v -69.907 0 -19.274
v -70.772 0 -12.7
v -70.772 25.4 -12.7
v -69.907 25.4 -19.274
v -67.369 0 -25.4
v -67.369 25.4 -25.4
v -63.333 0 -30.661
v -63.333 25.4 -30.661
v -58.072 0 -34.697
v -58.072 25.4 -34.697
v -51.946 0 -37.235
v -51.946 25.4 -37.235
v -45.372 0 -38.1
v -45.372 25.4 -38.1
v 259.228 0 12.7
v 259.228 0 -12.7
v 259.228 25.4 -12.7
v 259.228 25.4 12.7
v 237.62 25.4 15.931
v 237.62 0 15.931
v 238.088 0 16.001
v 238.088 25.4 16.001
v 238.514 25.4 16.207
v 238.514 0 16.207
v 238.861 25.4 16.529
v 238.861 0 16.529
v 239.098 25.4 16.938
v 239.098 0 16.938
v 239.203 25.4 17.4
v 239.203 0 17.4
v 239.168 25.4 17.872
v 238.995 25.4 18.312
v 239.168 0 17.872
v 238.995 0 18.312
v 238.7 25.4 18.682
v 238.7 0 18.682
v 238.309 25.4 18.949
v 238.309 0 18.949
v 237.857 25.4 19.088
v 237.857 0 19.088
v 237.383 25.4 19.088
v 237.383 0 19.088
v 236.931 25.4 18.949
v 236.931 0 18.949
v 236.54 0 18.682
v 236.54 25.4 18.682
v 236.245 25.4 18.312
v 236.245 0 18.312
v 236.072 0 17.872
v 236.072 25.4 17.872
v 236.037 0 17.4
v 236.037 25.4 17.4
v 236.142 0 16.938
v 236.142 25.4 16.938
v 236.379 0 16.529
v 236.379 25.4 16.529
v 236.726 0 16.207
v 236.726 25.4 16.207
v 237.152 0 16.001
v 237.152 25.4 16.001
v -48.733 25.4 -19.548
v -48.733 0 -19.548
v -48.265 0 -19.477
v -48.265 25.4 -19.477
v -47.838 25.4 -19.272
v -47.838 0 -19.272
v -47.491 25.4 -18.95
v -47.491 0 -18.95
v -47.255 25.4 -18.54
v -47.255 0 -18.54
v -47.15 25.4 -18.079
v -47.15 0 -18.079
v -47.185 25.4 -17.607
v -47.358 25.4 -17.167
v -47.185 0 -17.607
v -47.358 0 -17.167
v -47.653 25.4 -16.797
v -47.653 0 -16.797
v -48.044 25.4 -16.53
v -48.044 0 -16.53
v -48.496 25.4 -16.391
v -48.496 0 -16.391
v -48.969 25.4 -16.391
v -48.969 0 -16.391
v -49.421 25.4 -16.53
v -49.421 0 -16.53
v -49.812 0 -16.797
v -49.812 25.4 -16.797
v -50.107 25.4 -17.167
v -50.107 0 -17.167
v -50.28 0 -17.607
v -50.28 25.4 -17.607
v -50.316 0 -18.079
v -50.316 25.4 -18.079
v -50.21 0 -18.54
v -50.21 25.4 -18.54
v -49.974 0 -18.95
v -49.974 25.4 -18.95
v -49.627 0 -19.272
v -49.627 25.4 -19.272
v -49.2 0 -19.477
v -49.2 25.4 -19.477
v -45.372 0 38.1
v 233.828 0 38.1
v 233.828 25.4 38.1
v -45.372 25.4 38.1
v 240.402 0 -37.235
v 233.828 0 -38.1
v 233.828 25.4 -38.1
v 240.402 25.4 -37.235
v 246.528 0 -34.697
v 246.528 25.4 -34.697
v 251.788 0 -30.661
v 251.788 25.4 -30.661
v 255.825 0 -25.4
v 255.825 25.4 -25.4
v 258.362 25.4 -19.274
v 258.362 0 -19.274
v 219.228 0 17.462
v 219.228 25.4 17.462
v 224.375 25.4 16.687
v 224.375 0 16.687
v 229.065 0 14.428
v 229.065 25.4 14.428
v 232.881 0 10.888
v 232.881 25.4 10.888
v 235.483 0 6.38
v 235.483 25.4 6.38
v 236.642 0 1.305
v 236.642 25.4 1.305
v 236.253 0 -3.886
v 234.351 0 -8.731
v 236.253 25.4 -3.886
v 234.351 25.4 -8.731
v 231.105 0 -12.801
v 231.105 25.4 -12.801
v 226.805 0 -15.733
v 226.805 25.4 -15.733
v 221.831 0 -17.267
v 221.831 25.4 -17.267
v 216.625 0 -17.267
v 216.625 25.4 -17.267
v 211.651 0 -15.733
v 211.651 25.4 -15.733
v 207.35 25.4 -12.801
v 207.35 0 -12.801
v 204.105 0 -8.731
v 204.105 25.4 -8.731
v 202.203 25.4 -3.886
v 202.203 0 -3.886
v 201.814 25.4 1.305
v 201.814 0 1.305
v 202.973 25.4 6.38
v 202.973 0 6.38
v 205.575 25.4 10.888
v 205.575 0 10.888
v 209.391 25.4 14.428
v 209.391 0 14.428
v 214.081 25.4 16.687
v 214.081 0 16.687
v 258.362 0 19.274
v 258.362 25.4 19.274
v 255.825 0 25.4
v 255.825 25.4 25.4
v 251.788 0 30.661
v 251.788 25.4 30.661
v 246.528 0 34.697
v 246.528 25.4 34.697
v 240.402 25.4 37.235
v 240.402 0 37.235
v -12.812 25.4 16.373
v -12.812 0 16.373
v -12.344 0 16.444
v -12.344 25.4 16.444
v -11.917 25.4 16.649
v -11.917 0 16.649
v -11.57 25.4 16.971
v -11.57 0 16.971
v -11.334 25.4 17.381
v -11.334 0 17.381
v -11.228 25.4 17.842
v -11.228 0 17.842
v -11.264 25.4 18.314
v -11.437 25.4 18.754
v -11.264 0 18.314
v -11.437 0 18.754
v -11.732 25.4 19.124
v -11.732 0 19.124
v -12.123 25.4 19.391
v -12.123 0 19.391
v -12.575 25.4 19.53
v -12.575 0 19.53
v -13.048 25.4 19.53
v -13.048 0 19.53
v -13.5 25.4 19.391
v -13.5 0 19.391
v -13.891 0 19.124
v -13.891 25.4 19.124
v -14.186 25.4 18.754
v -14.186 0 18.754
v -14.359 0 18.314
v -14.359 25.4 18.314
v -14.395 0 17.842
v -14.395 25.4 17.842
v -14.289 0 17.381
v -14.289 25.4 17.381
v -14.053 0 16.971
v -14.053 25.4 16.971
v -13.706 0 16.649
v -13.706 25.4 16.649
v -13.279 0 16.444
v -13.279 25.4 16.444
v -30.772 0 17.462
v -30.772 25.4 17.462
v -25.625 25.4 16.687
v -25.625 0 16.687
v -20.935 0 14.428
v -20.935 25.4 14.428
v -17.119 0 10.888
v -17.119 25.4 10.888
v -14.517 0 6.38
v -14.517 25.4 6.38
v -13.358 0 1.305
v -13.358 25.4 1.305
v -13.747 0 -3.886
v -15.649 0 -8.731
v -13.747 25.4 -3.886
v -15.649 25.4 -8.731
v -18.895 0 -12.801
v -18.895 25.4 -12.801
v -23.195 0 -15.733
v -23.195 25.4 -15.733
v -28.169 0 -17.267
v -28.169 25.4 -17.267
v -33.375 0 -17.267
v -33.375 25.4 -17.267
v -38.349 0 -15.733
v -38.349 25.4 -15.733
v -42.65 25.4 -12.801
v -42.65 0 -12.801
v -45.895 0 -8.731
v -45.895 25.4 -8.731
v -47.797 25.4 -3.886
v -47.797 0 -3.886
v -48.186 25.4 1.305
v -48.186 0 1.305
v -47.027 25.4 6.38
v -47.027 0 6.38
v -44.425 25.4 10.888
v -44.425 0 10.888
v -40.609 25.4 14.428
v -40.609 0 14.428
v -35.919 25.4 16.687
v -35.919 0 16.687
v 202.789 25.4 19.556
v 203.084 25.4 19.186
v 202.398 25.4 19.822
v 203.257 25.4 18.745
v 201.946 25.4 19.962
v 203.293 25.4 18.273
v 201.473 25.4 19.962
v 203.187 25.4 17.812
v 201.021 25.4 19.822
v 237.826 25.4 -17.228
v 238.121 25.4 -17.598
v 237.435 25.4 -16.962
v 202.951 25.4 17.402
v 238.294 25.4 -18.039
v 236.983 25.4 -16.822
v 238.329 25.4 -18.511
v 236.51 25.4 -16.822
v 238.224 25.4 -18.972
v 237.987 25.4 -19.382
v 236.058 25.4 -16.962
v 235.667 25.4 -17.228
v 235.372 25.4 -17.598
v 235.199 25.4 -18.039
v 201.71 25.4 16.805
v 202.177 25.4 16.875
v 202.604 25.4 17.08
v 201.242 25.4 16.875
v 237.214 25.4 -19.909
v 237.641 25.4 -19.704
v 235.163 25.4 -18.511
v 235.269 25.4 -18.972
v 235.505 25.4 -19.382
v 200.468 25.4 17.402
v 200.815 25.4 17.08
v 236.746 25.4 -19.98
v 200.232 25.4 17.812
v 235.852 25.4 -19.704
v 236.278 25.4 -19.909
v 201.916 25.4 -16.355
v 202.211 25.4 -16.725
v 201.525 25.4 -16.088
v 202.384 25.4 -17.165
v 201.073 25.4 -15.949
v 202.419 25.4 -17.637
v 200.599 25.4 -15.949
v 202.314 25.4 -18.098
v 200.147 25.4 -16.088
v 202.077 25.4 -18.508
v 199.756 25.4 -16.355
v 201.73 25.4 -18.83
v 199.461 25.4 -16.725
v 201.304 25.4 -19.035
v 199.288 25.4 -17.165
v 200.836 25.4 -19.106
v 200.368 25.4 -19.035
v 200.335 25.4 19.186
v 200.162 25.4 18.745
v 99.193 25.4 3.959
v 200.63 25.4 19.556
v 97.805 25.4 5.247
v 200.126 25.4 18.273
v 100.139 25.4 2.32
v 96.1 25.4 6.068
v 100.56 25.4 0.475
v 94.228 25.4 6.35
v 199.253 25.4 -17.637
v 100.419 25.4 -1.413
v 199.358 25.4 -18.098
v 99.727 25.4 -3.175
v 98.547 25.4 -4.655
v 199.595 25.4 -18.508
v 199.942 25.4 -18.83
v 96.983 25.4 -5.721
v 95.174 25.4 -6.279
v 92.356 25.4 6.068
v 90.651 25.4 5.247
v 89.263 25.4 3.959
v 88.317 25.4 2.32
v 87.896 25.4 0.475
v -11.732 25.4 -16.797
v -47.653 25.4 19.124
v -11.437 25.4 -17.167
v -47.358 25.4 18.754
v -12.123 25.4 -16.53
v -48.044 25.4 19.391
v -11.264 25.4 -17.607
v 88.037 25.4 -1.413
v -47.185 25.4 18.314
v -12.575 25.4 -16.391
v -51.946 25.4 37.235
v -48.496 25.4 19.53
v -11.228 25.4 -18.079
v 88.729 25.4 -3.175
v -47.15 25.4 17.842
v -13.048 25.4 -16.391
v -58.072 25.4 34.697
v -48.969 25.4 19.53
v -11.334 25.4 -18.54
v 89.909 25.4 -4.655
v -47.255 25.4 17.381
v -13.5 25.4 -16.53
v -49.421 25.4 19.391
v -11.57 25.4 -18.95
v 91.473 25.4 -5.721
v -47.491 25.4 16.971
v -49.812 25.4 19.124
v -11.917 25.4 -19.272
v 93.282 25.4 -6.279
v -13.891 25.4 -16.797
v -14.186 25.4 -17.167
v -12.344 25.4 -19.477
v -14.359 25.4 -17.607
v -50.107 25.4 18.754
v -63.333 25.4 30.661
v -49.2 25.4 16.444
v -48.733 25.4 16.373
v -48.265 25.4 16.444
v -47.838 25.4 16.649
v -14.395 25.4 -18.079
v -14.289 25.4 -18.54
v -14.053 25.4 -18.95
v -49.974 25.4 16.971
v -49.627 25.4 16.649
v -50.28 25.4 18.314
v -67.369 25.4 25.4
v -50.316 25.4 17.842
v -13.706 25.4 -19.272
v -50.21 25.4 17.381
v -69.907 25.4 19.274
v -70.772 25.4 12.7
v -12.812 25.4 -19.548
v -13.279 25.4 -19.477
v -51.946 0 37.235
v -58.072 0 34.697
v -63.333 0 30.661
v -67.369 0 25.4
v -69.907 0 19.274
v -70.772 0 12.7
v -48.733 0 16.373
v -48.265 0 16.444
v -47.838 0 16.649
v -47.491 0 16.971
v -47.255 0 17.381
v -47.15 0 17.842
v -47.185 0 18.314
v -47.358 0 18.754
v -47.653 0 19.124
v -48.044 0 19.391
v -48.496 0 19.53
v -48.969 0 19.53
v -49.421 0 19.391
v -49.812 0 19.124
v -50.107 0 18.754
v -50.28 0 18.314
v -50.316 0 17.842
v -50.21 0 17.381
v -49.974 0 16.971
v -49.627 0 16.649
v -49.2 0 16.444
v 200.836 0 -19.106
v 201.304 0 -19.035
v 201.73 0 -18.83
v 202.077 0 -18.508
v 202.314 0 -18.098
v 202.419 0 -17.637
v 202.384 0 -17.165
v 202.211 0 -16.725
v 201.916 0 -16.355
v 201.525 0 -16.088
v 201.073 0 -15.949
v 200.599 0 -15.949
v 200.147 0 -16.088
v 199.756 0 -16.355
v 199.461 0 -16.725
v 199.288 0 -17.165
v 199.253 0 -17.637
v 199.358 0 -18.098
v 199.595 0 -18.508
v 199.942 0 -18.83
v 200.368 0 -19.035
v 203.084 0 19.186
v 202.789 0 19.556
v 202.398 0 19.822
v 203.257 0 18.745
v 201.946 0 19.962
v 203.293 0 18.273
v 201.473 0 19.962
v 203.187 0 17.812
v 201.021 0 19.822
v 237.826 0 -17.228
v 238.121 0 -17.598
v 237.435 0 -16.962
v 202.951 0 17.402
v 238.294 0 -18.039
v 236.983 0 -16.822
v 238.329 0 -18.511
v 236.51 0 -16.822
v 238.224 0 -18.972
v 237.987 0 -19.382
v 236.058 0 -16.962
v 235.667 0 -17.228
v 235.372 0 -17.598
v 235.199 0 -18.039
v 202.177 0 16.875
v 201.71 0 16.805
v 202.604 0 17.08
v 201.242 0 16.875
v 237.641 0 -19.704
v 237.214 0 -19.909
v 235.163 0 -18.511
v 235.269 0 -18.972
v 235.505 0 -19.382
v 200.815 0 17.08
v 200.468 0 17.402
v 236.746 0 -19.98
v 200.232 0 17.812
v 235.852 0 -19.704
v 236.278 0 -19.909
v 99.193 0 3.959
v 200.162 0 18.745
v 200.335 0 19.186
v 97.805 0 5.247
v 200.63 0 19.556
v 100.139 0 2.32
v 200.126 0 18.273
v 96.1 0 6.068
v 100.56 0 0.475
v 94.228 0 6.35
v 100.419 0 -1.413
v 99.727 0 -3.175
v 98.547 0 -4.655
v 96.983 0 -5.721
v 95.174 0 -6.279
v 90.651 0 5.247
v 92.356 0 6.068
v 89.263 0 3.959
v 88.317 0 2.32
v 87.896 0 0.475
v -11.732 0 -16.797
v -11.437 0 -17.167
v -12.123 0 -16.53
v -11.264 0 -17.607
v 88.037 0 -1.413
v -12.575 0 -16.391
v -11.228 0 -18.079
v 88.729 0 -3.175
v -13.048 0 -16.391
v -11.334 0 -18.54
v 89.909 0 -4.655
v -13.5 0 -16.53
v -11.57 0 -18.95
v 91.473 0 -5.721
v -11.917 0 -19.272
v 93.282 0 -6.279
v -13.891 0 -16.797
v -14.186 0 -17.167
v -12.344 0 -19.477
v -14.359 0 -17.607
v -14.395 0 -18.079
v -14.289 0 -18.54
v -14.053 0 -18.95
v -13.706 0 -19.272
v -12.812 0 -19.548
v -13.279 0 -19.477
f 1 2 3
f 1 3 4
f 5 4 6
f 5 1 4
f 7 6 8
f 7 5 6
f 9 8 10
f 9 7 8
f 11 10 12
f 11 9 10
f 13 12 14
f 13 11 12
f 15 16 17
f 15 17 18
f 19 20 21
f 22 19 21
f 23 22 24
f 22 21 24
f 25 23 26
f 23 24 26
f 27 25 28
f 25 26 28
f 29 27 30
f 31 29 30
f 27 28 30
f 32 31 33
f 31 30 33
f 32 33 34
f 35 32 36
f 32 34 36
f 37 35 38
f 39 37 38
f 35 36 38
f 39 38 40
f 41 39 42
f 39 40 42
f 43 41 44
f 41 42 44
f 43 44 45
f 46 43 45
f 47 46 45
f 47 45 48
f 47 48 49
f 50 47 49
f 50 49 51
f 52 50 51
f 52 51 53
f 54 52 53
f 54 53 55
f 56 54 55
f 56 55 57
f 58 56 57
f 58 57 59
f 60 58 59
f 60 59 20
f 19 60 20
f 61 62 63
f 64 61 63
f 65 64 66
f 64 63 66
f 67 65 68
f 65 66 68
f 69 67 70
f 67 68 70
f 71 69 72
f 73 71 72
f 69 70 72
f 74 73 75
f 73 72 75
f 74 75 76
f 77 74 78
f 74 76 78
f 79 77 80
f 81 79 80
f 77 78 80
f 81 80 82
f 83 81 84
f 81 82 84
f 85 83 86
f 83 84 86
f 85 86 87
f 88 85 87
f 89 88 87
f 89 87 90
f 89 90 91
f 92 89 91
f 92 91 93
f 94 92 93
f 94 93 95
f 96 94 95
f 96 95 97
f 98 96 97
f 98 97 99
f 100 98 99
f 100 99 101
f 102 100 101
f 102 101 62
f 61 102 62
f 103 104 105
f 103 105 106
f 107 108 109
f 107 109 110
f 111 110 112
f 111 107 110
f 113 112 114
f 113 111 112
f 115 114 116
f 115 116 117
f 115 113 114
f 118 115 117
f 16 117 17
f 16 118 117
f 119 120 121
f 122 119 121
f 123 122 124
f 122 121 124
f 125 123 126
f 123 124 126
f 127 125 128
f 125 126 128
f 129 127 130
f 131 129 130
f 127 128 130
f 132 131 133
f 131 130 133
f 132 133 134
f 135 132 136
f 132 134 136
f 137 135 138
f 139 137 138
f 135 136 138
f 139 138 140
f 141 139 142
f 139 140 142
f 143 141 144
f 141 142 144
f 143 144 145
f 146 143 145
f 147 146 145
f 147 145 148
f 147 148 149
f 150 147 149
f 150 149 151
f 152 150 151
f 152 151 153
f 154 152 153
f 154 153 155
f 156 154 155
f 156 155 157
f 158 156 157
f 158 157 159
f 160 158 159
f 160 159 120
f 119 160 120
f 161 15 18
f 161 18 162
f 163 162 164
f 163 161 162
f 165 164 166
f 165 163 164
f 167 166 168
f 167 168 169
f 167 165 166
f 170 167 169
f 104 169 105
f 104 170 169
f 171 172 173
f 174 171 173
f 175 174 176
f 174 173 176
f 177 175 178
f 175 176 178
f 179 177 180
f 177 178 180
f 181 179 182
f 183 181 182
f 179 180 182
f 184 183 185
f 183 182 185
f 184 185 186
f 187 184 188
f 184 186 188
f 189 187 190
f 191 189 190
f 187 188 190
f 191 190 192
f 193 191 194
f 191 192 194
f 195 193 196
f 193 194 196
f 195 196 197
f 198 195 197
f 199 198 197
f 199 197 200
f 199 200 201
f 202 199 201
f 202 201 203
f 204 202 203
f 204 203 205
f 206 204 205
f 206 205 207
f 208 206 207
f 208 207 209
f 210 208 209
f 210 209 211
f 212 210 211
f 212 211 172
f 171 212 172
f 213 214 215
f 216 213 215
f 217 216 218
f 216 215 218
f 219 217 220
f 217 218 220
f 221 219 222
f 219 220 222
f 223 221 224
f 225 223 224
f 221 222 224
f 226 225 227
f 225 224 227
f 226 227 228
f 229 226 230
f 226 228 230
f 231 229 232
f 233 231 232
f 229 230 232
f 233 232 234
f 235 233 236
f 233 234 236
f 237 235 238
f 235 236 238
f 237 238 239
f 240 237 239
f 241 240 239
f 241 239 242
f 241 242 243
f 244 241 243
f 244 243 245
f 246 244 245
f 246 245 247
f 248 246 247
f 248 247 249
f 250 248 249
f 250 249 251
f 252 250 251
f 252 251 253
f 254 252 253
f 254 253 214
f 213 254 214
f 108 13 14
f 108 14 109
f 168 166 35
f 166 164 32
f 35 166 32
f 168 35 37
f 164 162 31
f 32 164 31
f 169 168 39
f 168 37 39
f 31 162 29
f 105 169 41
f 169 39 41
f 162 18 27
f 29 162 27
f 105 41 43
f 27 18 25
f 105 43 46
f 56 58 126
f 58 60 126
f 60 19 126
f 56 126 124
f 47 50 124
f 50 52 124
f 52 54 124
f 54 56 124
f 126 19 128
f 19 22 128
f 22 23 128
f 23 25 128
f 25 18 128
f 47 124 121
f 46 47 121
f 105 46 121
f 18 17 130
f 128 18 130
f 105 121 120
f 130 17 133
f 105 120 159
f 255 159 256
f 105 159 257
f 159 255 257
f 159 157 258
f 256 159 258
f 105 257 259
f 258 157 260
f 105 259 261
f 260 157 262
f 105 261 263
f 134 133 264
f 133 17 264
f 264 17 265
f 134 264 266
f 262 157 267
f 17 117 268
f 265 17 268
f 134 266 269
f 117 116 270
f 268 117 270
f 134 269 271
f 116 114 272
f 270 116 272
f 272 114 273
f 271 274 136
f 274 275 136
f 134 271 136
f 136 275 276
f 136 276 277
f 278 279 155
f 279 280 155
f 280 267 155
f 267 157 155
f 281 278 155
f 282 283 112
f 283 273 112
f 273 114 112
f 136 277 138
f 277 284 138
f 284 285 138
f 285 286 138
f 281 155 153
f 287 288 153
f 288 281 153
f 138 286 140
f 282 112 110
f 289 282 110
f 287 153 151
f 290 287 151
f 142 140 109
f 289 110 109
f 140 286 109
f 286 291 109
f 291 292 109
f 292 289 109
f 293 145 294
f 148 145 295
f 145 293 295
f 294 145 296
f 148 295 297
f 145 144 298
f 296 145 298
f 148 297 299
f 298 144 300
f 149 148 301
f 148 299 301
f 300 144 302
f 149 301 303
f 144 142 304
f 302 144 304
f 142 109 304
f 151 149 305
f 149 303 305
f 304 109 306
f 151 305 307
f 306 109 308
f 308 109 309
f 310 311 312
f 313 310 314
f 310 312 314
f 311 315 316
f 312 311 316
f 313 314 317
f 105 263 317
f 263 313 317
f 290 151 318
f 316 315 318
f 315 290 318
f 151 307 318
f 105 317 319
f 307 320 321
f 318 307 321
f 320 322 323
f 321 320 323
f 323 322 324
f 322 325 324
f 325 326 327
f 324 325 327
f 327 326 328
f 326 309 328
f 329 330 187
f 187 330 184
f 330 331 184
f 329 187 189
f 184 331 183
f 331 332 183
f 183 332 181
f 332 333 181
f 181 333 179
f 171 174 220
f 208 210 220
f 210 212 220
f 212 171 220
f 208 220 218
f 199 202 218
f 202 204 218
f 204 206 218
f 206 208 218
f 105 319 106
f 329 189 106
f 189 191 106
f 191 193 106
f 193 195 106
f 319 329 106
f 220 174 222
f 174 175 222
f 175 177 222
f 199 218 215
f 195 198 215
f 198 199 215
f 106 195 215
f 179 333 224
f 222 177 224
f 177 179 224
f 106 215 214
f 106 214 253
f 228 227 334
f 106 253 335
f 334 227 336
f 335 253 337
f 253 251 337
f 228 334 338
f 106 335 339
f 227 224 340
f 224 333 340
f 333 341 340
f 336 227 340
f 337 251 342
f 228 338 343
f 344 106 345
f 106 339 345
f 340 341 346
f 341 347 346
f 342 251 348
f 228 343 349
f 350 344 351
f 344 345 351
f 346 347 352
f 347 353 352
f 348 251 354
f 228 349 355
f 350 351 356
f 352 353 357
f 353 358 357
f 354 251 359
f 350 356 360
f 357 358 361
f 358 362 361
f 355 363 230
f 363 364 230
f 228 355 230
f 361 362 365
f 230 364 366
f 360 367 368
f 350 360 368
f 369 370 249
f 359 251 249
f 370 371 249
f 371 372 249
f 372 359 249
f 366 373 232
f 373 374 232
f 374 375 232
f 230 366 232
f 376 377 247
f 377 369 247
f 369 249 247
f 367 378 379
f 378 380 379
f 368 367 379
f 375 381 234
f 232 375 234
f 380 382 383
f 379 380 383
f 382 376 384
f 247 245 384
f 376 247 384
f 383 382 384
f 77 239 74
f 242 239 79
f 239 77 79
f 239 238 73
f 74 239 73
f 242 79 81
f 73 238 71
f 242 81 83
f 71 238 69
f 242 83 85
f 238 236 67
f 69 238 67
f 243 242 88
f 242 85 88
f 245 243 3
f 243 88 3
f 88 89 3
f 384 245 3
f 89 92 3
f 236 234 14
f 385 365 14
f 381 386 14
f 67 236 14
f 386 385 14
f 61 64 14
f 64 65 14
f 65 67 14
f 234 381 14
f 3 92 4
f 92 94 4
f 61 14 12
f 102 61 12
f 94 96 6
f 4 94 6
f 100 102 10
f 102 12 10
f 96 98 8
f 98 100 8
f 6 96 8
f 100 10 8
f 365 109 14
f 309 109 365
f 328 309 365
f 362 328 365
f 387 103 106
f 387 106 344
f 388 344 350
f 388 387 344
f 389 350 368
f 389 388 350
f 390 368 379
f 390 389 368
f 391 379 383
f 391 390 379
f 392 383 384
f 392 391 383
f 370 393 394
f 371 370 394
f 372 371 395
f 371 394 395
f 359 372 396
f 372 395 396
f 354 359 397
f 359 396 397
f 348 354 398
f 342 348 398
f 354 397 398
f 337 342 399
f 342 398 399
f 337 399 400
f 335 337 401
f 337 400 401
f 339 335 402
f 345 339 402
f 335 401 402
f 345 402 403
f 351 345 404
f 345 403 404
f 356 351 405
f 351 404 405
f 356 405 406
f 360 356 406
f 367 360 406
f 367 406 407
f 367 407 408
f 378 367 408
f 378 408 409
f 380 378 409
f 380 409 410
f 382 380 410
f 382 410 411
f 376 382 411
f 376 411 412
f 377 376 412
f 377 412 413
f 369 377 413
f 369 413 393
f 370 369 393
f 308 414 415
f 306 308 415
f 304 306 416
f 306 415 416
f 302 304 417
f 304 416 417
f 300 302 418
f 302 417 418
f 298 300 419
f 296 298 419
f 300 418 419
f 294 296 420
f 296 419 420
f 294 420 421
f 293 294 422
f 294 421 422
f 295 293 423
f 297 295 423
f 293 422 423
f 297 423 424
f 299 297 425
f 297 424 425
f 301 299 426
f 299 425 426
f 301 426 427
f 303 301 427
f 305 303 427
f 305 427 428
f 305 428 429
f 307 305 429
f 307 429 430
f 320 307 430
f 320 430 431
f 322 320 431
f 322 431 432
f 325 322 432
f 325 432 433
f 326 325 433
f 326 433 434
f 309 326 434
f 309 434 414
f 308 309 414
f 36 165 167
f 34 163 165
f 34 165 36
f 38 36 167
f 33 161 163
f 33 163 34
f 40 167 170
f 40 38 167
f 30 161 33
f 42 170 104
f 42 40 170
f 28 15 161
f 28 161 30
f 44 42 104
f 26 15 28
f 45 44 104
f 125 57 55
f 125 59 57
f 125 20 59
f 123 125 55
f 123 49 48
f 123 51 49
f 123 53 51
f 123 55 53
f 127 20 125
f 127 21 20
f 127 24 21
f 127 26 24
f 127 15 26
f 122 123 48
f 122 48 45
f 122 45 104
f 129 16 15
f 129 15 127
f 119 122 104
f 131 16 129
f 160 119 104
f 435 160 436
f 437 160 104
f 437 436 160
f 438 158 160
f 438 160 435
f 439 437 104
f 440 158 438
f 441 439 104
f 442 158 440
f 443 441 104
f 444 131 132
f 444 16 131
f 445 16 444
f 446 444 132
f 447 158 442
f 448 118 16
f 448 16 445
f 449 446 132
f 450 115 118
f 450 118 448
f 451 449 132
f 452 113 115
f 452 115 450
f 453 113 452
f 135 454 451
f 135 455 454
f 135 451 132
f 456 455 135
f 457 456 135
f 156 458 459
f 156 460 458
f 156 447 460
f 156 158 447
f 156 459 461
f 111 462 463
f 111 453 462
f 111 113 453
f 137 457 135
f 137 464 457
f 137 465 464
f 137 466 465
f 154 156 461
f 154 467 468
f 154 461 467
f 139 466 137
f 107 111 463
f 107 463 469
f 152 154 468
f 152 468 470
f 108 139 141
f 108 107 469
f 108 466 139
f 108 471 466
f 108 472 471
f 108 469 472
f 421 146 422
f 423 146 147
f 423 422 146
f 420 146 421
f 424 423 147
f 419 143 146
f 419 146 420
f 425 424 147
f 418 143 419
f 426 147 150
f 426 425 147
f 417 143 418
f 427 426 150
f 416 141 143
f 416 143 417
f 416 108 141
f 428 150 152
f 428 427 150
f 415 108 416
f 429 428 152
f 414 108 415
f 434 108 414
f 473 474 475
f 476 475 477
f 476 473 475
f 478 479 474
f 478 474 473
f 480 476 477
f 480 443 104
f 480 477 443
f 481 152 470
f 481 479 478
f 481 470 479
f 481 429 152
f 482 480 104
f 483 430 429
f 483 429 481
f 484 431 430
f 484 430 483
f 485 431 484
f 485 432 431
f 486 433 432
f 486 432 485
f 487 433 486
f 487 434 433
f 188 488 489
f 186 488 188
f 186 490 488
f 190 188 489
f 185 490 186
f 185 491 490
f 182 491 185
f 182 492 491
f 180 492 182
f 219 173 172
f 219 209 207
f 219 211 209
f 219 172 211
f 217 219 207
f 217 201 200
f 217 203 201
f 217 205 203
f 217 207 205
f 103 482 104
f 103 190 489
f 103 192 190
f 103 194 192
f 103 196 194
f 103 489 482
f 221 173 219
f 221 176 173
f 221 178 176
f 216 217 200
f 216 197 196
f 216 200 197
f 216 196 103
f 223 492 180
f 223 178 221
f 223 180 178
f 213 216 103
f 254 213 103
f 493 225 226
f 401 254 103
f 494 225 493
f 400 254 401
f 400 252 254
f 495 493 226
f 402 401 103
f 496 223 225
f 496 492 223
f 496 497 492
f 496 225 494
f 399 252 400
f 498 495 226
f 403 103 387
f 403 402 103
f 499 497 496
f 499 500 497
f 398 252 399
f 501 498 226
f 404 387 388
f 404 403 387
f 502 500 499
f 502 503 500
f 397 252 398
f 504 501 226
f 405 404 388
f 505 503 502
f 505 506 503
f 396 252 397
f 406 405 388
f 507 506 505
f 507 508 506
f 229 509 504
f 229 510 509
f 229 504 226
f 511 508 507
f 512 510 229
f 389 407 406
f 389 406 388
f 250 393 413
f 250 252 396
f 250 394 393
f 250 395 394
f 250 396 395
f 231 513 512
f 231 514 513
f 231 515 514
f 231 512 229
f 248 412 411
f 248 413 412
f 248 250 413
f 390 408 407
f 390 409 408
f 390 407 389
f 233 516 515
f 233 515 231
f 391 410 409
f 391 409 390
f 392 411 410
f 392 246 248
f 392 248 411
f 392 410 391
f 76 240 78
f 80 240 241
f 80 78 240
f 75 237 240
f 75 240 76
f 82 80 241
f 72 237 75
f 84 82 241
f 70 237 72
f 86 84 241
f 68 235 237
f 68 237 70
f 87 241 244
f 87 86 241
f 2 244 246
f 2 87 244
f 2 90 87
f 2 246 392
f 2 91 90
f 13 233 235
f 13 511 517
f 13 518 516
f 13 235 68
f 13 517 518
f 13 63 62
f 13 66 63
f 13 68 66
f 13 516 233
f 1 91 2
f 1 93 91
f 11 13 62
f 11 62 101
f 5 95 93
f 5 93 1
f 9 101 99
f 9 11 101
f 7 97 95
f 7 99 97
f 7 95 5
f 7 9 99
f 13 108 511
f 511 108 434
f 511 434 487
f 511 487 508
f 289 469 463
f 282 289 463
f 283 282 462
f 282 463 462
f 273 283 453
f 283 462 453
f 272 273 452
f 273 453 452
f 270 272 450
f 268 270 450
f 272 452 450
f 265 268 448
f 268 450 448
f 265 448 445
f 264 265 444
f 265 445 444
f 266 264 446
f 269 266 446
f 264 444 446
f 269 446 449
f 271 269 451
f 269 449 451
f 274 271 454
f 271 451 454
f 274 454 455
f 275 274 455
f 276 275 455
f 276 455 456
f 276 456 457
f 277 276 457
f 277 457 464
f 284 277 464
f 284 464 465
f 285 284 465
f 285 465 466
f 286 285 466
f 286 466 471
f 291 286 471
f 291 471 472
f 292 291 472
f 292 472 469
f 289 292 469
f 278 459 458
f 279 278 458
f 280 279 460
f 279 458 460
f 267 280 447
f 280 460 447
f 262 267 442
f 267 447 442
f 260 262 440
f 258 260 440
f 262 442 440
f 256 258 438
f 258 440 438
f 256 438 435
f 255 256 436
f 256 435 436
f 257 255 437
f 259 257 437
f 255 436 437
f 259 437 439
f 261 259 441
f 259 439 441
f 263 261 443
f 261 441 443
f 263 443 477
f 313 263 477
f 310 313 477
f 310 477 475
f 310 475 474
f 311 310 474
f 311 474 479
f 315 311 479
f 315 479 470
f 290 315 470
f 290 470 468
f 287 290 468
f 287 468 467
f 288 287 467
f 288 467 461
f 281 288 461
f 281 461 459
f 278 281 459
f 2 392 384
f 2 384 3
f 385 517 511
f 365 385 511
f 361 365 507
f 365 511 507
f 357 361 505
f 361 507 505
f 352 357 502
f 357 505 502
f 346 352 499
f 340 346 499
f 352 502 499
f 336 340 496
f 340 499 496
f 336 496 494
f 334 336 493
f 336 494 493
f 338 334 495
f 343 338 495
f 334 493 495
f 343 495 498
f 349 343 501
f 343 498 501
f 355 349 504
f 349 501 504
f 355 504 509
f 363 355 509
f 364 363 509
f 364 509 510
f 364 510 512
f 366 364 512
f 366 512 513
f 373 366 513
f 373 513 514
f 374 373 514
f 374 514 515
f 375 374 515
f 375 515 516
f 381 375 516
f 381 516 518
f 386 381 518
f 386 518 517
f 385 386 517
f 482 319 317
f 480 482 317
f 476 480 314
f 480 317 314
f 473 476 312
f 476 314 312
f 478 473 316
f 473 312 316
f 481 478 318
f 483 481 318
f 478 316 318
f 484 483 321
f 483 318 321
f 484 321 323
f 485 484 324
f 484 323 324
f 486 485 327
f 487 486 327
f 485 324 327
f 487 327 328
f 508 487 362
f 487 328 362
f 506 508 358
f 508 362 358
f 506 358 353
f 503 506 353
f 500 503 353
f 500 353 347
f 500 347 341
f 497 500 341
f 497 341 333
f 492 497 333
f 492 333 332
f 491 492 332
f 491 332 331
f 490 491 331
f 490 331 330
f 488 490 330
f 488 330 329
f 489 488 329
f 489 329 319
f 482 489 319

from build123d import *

# Parameters (mm, degrees)
BOSS_EXTRUDE1_DEPTH = 25.4
CUT_EXTRUDE1_REACH  = 265.241
SKETCH5_R           = 6.35
SKETCH5_R_2         = 17.4625
CUT_EXTRUDE2_REACH  = 265.241
SKETCH6_R           = 1.5875


with BuildPart() as part:
    # Sketch4 → Boss-Extrude1 (new body)
    with BuildSketch(Plane(origin=(0, 0, 0), x_dir=(1, 0, 0), z_dir=(0, 1, 0))):
        with BuildLine():
            Line((233.827945205, -38.1), (-45.372054795, -38.1))
            ThreePointArc((-45.372054795, -38.1), (-63.332567037, -30.660512242), (-70.772054795, -12.7))
            Line((-70.772054795, -12.7), (-70.772054795, 12.7))
            ThreePointArc((-70.772054795, 12.7), (-63.332567037, 30.660512242), (-45.372054795, 38.1))
            Line((-45.372054795, 38.1), (233.827945205, 38.1))
            ThreePointArc((233.827945205, 38.1), (251.788457448, 30.660512242), (259.227945205, 12.7))
            Line((259.227945205, 12.7), (259.227945205, -12.7))
            ThreePointArc((259.227945205, -12.7), (251.788457448, -30.660512242), (233.827945205, -38.1))
        make_face()
    extrude(amount=BOSS_EXTRUDE1_DEPTH)

    # Sketch5 → Cut-Extrude1 (cut, up to next)
    with BuildSketch(Plane(origin=(0, 25.4, 0), x_dir=(1, 0, 0), z_dir=(0, 1, 0)), mode=Mode.PRIVATE) as cut_extrude1_sk1:
        with Locations(Location((94.227945205, 0, 0), (0, 0, 270))):
            Circle(SKETCH5_R)
    cut_extrude1_tool1 = extrude(cut_extrude1_sk1.sketch, amount=-CUT_EXTRUDE1_REACH, mode=Mode.PRIVATE) & part.part
    # Sketch5 → Cut-Extrude1 (cut, up to next)
    with BuildSketch(Plane(origin=(0, 25.4, 0), x_dir=(1, 0, 0), z_dir=(0, 1, 0)), mode=Mode.PRIVATE) as cut_extrude1_sk2:
        with Locations(Location((-30.772054795, 0, 0), (0, 0, 270))):
            Circle(SKETCH5_R_2)
    cut_extrude1_tool2 = extrude(cut_extrude1_sk2.sketch, amount=-CUT_EXTRUDE1_REACH, mode=Mode.PRIVATE) & part.part
    # Sketch5 → Cut-Extrude1 (cut, up to next)
    with BuildSketch(Plane(origin=(0, 25.4, 0), x_dir=(1, 0, 0), z_dir=(0, 1, 0)), mode=Mode.PRIVATE) as cut_extrude1_sk3:
        with Locations(Location((219.227945205, 0, 0), (0, 0, 270))):
            Circle(SKETCH5_R_2)
    cut_extrude1_tool3 = extrude(cut_extrude1_sk3.sketch, amount=-CUT_EXTRUDE1_REACH, mode=Mode.PRIVATE) & part.part
    add(cut_extrude1_tool1.solids().sort_by_distance((94.227945, 25.4, 0))[0], mode=Mode.SUBTRACT)
    add(cut_extrude1_tool2.solids().sort_by_distance((-30.772055, 25.4, 0))[0], mode=Mode.SUBTRACT)
    add(cut_extrude1_tool3.solids().sort_by_distance((219.227945, 25.4, 0))[0], mode=Mode.SUBTRACT)

    # Sketch6 → Cut-Extrude2 (cut, up to next)
    with BuildSketch(Plane.XZ, mode=Mode.PRIVATE) as cut_extrude2_sk1:
        with Locations(Location((201.709555727, 18.392009952, 0), (0, 0, 270))):
            Circle(SKETCH6_R)
    cut_extrude2_tool1 = extrude(cut_extrude2_sk1.sketch, amount=-CUT_EXTRUDE2_REACH, mode=Mode.PRIVATE) & part.part
    # Sketch6 → Cut-Extrude2 (cut, up to next)
    with BuildSketch(Plane.XZ, mode=Mode.PRIVATE) as cut_extrude2_sk2:
        with Locations(Location((237.619955157, 17.518389479, 0), (0, 0, 270))):
            Circle(SKETCH6_R)
    cut_extrude2_tool2 = extrude(cut_extrude2_sk2.sketch, amount=-CUT_EXTRUDE2_REACH, mode=Mode.PRIVATE) & part.part
    # Sketch6 → Cut-Extrude2 (cut, up to next)
    with BuildSketch(Plane.XZ, mode=Mode.PRIVATE) as cut_extrude2_sk3:
        with Locations(Location((236.746334684, -18.392009952, 0), (0, 0, 270))):
            Circle(SKETCH6_R)
    cut_extrude2_tool3 = extrude(cut_extrude2_sk3.sketch, amount=-CUT_EXTRUDE2_REACH, mode=Mode.PRIVATE) & part.part
    # Sketch6 → Cut-Extrude2 (cut, up to next)
    with BuildSketch(Plane.XZ, mode=Mode.PRIVATE) as cut_extrude2_sk4:
        with Locations(Location((200.835935254, -17.518389479, 0), (0, 0, 270))):
            Circle(SKETCH6_R)
    cut_extrude2_tool4 = extrude(cut_extrude2_sk4.sketch, amount=-CUT_EXTRUDE2_REACH, mode=Mode.PRIVATE) & part.part
    # Sketch6 → Cut-Extrude2 (cut, up to next)
    with BuildSketch(Plane.XZ, mode=Mode.PRIVATE) as cut_extrude2_sk5:
        with Locations(Location((-48.732567037, 17.960512242, 0), (0, 0, 270))):
            Circle(SKETCH6_R)
    cut_extrude2_tool5 = extrude(cut_extrude2_sk5.sketch, amount=-CUT_EXTRUDE2_REACH, mode=Mode.PRIVATE) & part.part
    # Sketch6 → Cut-Extrude2 (cut, up to next)
    with BuildSketch(Plane.XZ, mode=Mode.PRIVATE) as cut_extrude2_sk6:
        with Locations(Location((-12.811542552, 17.960512242, 0), (0, 0, 270))):
            Circle(SKETCH6_R)
    cut_extrude2_tool6 = extrude(cut_extrude2_sk6.sketch, amount=-CUT_EXTRUDE2_REACH, mode=Mode.PRIVATE) & part.part
    # Sketch6 → Cut-Extrude2 (cut, up to next)
    with BuildSketch(Plane.XZ, mode=Mode.PRIVATE) as cut_extrude2_sk7:
        with Locations(Location((-12.811542552, -17.960512242, 0), (0, 0, 270))):
            Circle(SKETCH6_R)
    cut_extrude2_tool7 = extrude(cut_extrude2_sk7.sketch, amount=-CUT_EXTRUDE2_REACH, mode=Mode.PRIVATE) & part.part
    # Sketch6 → Cut-Extrude2 (cut, up to next)
    with BuildSketch(Plane.XZ, mode=Mode.PRIVATE) as cut_extrude2_sk8:
        with Locations(Location((-48.732567037, -17.960512242, 0), (0, 0, 270))):
            Circle(SKETCH6_R)
    cut_extrude2_tool8 = extrude(cut_extrude2_sk8.sketch, amount=-CUT_EXTRUDE2_REACH, mode=Mode.PRIVATE) & part.part
    add(cut_extrude2_tool1.solids().sort_by_distance((201.709556, 0, 18.39201))[0], mode=Mode.SUBTRACT)
    add(cut_extrude2_tool2.solids().sort_by_distance((237.619955, 0, 17.518389))[0], mode=Mode.SUBTRACT)
    add(cut_extrude2_tool3.solids().sort_by_distance((236.746335, 0, -18.39201))[0], mode=Mode.SUBTRACT)
    add(cut_extrude2_tool4.solids().sort_by_distance((200.835935, 0, -17.518389))[0], mode=Mode.SUBTRACT)
    add(cut_extrude2_tool5.solids().sort_by_distance((-48.732567, 0, 17.960512))[0], mode=Mode.SUBTRACT)
    add(cut_extrude2_tool6.solids().sort_by_distance((-12.811543, 0, 17.960512))[0], mode=Mode.SUBTRACT)
    add(cut_extrude2_tool7.solids().sort_by_distance((-12.811543, 0, -17.960512))[0], mode=Mode.SUBTRACT)
    add(cut_extrude2_tool8.solids().sort_by_distance((-48.732567, 0, -17.960512))[0], mode=Mode.SUBTRACT)


solid = part.part
